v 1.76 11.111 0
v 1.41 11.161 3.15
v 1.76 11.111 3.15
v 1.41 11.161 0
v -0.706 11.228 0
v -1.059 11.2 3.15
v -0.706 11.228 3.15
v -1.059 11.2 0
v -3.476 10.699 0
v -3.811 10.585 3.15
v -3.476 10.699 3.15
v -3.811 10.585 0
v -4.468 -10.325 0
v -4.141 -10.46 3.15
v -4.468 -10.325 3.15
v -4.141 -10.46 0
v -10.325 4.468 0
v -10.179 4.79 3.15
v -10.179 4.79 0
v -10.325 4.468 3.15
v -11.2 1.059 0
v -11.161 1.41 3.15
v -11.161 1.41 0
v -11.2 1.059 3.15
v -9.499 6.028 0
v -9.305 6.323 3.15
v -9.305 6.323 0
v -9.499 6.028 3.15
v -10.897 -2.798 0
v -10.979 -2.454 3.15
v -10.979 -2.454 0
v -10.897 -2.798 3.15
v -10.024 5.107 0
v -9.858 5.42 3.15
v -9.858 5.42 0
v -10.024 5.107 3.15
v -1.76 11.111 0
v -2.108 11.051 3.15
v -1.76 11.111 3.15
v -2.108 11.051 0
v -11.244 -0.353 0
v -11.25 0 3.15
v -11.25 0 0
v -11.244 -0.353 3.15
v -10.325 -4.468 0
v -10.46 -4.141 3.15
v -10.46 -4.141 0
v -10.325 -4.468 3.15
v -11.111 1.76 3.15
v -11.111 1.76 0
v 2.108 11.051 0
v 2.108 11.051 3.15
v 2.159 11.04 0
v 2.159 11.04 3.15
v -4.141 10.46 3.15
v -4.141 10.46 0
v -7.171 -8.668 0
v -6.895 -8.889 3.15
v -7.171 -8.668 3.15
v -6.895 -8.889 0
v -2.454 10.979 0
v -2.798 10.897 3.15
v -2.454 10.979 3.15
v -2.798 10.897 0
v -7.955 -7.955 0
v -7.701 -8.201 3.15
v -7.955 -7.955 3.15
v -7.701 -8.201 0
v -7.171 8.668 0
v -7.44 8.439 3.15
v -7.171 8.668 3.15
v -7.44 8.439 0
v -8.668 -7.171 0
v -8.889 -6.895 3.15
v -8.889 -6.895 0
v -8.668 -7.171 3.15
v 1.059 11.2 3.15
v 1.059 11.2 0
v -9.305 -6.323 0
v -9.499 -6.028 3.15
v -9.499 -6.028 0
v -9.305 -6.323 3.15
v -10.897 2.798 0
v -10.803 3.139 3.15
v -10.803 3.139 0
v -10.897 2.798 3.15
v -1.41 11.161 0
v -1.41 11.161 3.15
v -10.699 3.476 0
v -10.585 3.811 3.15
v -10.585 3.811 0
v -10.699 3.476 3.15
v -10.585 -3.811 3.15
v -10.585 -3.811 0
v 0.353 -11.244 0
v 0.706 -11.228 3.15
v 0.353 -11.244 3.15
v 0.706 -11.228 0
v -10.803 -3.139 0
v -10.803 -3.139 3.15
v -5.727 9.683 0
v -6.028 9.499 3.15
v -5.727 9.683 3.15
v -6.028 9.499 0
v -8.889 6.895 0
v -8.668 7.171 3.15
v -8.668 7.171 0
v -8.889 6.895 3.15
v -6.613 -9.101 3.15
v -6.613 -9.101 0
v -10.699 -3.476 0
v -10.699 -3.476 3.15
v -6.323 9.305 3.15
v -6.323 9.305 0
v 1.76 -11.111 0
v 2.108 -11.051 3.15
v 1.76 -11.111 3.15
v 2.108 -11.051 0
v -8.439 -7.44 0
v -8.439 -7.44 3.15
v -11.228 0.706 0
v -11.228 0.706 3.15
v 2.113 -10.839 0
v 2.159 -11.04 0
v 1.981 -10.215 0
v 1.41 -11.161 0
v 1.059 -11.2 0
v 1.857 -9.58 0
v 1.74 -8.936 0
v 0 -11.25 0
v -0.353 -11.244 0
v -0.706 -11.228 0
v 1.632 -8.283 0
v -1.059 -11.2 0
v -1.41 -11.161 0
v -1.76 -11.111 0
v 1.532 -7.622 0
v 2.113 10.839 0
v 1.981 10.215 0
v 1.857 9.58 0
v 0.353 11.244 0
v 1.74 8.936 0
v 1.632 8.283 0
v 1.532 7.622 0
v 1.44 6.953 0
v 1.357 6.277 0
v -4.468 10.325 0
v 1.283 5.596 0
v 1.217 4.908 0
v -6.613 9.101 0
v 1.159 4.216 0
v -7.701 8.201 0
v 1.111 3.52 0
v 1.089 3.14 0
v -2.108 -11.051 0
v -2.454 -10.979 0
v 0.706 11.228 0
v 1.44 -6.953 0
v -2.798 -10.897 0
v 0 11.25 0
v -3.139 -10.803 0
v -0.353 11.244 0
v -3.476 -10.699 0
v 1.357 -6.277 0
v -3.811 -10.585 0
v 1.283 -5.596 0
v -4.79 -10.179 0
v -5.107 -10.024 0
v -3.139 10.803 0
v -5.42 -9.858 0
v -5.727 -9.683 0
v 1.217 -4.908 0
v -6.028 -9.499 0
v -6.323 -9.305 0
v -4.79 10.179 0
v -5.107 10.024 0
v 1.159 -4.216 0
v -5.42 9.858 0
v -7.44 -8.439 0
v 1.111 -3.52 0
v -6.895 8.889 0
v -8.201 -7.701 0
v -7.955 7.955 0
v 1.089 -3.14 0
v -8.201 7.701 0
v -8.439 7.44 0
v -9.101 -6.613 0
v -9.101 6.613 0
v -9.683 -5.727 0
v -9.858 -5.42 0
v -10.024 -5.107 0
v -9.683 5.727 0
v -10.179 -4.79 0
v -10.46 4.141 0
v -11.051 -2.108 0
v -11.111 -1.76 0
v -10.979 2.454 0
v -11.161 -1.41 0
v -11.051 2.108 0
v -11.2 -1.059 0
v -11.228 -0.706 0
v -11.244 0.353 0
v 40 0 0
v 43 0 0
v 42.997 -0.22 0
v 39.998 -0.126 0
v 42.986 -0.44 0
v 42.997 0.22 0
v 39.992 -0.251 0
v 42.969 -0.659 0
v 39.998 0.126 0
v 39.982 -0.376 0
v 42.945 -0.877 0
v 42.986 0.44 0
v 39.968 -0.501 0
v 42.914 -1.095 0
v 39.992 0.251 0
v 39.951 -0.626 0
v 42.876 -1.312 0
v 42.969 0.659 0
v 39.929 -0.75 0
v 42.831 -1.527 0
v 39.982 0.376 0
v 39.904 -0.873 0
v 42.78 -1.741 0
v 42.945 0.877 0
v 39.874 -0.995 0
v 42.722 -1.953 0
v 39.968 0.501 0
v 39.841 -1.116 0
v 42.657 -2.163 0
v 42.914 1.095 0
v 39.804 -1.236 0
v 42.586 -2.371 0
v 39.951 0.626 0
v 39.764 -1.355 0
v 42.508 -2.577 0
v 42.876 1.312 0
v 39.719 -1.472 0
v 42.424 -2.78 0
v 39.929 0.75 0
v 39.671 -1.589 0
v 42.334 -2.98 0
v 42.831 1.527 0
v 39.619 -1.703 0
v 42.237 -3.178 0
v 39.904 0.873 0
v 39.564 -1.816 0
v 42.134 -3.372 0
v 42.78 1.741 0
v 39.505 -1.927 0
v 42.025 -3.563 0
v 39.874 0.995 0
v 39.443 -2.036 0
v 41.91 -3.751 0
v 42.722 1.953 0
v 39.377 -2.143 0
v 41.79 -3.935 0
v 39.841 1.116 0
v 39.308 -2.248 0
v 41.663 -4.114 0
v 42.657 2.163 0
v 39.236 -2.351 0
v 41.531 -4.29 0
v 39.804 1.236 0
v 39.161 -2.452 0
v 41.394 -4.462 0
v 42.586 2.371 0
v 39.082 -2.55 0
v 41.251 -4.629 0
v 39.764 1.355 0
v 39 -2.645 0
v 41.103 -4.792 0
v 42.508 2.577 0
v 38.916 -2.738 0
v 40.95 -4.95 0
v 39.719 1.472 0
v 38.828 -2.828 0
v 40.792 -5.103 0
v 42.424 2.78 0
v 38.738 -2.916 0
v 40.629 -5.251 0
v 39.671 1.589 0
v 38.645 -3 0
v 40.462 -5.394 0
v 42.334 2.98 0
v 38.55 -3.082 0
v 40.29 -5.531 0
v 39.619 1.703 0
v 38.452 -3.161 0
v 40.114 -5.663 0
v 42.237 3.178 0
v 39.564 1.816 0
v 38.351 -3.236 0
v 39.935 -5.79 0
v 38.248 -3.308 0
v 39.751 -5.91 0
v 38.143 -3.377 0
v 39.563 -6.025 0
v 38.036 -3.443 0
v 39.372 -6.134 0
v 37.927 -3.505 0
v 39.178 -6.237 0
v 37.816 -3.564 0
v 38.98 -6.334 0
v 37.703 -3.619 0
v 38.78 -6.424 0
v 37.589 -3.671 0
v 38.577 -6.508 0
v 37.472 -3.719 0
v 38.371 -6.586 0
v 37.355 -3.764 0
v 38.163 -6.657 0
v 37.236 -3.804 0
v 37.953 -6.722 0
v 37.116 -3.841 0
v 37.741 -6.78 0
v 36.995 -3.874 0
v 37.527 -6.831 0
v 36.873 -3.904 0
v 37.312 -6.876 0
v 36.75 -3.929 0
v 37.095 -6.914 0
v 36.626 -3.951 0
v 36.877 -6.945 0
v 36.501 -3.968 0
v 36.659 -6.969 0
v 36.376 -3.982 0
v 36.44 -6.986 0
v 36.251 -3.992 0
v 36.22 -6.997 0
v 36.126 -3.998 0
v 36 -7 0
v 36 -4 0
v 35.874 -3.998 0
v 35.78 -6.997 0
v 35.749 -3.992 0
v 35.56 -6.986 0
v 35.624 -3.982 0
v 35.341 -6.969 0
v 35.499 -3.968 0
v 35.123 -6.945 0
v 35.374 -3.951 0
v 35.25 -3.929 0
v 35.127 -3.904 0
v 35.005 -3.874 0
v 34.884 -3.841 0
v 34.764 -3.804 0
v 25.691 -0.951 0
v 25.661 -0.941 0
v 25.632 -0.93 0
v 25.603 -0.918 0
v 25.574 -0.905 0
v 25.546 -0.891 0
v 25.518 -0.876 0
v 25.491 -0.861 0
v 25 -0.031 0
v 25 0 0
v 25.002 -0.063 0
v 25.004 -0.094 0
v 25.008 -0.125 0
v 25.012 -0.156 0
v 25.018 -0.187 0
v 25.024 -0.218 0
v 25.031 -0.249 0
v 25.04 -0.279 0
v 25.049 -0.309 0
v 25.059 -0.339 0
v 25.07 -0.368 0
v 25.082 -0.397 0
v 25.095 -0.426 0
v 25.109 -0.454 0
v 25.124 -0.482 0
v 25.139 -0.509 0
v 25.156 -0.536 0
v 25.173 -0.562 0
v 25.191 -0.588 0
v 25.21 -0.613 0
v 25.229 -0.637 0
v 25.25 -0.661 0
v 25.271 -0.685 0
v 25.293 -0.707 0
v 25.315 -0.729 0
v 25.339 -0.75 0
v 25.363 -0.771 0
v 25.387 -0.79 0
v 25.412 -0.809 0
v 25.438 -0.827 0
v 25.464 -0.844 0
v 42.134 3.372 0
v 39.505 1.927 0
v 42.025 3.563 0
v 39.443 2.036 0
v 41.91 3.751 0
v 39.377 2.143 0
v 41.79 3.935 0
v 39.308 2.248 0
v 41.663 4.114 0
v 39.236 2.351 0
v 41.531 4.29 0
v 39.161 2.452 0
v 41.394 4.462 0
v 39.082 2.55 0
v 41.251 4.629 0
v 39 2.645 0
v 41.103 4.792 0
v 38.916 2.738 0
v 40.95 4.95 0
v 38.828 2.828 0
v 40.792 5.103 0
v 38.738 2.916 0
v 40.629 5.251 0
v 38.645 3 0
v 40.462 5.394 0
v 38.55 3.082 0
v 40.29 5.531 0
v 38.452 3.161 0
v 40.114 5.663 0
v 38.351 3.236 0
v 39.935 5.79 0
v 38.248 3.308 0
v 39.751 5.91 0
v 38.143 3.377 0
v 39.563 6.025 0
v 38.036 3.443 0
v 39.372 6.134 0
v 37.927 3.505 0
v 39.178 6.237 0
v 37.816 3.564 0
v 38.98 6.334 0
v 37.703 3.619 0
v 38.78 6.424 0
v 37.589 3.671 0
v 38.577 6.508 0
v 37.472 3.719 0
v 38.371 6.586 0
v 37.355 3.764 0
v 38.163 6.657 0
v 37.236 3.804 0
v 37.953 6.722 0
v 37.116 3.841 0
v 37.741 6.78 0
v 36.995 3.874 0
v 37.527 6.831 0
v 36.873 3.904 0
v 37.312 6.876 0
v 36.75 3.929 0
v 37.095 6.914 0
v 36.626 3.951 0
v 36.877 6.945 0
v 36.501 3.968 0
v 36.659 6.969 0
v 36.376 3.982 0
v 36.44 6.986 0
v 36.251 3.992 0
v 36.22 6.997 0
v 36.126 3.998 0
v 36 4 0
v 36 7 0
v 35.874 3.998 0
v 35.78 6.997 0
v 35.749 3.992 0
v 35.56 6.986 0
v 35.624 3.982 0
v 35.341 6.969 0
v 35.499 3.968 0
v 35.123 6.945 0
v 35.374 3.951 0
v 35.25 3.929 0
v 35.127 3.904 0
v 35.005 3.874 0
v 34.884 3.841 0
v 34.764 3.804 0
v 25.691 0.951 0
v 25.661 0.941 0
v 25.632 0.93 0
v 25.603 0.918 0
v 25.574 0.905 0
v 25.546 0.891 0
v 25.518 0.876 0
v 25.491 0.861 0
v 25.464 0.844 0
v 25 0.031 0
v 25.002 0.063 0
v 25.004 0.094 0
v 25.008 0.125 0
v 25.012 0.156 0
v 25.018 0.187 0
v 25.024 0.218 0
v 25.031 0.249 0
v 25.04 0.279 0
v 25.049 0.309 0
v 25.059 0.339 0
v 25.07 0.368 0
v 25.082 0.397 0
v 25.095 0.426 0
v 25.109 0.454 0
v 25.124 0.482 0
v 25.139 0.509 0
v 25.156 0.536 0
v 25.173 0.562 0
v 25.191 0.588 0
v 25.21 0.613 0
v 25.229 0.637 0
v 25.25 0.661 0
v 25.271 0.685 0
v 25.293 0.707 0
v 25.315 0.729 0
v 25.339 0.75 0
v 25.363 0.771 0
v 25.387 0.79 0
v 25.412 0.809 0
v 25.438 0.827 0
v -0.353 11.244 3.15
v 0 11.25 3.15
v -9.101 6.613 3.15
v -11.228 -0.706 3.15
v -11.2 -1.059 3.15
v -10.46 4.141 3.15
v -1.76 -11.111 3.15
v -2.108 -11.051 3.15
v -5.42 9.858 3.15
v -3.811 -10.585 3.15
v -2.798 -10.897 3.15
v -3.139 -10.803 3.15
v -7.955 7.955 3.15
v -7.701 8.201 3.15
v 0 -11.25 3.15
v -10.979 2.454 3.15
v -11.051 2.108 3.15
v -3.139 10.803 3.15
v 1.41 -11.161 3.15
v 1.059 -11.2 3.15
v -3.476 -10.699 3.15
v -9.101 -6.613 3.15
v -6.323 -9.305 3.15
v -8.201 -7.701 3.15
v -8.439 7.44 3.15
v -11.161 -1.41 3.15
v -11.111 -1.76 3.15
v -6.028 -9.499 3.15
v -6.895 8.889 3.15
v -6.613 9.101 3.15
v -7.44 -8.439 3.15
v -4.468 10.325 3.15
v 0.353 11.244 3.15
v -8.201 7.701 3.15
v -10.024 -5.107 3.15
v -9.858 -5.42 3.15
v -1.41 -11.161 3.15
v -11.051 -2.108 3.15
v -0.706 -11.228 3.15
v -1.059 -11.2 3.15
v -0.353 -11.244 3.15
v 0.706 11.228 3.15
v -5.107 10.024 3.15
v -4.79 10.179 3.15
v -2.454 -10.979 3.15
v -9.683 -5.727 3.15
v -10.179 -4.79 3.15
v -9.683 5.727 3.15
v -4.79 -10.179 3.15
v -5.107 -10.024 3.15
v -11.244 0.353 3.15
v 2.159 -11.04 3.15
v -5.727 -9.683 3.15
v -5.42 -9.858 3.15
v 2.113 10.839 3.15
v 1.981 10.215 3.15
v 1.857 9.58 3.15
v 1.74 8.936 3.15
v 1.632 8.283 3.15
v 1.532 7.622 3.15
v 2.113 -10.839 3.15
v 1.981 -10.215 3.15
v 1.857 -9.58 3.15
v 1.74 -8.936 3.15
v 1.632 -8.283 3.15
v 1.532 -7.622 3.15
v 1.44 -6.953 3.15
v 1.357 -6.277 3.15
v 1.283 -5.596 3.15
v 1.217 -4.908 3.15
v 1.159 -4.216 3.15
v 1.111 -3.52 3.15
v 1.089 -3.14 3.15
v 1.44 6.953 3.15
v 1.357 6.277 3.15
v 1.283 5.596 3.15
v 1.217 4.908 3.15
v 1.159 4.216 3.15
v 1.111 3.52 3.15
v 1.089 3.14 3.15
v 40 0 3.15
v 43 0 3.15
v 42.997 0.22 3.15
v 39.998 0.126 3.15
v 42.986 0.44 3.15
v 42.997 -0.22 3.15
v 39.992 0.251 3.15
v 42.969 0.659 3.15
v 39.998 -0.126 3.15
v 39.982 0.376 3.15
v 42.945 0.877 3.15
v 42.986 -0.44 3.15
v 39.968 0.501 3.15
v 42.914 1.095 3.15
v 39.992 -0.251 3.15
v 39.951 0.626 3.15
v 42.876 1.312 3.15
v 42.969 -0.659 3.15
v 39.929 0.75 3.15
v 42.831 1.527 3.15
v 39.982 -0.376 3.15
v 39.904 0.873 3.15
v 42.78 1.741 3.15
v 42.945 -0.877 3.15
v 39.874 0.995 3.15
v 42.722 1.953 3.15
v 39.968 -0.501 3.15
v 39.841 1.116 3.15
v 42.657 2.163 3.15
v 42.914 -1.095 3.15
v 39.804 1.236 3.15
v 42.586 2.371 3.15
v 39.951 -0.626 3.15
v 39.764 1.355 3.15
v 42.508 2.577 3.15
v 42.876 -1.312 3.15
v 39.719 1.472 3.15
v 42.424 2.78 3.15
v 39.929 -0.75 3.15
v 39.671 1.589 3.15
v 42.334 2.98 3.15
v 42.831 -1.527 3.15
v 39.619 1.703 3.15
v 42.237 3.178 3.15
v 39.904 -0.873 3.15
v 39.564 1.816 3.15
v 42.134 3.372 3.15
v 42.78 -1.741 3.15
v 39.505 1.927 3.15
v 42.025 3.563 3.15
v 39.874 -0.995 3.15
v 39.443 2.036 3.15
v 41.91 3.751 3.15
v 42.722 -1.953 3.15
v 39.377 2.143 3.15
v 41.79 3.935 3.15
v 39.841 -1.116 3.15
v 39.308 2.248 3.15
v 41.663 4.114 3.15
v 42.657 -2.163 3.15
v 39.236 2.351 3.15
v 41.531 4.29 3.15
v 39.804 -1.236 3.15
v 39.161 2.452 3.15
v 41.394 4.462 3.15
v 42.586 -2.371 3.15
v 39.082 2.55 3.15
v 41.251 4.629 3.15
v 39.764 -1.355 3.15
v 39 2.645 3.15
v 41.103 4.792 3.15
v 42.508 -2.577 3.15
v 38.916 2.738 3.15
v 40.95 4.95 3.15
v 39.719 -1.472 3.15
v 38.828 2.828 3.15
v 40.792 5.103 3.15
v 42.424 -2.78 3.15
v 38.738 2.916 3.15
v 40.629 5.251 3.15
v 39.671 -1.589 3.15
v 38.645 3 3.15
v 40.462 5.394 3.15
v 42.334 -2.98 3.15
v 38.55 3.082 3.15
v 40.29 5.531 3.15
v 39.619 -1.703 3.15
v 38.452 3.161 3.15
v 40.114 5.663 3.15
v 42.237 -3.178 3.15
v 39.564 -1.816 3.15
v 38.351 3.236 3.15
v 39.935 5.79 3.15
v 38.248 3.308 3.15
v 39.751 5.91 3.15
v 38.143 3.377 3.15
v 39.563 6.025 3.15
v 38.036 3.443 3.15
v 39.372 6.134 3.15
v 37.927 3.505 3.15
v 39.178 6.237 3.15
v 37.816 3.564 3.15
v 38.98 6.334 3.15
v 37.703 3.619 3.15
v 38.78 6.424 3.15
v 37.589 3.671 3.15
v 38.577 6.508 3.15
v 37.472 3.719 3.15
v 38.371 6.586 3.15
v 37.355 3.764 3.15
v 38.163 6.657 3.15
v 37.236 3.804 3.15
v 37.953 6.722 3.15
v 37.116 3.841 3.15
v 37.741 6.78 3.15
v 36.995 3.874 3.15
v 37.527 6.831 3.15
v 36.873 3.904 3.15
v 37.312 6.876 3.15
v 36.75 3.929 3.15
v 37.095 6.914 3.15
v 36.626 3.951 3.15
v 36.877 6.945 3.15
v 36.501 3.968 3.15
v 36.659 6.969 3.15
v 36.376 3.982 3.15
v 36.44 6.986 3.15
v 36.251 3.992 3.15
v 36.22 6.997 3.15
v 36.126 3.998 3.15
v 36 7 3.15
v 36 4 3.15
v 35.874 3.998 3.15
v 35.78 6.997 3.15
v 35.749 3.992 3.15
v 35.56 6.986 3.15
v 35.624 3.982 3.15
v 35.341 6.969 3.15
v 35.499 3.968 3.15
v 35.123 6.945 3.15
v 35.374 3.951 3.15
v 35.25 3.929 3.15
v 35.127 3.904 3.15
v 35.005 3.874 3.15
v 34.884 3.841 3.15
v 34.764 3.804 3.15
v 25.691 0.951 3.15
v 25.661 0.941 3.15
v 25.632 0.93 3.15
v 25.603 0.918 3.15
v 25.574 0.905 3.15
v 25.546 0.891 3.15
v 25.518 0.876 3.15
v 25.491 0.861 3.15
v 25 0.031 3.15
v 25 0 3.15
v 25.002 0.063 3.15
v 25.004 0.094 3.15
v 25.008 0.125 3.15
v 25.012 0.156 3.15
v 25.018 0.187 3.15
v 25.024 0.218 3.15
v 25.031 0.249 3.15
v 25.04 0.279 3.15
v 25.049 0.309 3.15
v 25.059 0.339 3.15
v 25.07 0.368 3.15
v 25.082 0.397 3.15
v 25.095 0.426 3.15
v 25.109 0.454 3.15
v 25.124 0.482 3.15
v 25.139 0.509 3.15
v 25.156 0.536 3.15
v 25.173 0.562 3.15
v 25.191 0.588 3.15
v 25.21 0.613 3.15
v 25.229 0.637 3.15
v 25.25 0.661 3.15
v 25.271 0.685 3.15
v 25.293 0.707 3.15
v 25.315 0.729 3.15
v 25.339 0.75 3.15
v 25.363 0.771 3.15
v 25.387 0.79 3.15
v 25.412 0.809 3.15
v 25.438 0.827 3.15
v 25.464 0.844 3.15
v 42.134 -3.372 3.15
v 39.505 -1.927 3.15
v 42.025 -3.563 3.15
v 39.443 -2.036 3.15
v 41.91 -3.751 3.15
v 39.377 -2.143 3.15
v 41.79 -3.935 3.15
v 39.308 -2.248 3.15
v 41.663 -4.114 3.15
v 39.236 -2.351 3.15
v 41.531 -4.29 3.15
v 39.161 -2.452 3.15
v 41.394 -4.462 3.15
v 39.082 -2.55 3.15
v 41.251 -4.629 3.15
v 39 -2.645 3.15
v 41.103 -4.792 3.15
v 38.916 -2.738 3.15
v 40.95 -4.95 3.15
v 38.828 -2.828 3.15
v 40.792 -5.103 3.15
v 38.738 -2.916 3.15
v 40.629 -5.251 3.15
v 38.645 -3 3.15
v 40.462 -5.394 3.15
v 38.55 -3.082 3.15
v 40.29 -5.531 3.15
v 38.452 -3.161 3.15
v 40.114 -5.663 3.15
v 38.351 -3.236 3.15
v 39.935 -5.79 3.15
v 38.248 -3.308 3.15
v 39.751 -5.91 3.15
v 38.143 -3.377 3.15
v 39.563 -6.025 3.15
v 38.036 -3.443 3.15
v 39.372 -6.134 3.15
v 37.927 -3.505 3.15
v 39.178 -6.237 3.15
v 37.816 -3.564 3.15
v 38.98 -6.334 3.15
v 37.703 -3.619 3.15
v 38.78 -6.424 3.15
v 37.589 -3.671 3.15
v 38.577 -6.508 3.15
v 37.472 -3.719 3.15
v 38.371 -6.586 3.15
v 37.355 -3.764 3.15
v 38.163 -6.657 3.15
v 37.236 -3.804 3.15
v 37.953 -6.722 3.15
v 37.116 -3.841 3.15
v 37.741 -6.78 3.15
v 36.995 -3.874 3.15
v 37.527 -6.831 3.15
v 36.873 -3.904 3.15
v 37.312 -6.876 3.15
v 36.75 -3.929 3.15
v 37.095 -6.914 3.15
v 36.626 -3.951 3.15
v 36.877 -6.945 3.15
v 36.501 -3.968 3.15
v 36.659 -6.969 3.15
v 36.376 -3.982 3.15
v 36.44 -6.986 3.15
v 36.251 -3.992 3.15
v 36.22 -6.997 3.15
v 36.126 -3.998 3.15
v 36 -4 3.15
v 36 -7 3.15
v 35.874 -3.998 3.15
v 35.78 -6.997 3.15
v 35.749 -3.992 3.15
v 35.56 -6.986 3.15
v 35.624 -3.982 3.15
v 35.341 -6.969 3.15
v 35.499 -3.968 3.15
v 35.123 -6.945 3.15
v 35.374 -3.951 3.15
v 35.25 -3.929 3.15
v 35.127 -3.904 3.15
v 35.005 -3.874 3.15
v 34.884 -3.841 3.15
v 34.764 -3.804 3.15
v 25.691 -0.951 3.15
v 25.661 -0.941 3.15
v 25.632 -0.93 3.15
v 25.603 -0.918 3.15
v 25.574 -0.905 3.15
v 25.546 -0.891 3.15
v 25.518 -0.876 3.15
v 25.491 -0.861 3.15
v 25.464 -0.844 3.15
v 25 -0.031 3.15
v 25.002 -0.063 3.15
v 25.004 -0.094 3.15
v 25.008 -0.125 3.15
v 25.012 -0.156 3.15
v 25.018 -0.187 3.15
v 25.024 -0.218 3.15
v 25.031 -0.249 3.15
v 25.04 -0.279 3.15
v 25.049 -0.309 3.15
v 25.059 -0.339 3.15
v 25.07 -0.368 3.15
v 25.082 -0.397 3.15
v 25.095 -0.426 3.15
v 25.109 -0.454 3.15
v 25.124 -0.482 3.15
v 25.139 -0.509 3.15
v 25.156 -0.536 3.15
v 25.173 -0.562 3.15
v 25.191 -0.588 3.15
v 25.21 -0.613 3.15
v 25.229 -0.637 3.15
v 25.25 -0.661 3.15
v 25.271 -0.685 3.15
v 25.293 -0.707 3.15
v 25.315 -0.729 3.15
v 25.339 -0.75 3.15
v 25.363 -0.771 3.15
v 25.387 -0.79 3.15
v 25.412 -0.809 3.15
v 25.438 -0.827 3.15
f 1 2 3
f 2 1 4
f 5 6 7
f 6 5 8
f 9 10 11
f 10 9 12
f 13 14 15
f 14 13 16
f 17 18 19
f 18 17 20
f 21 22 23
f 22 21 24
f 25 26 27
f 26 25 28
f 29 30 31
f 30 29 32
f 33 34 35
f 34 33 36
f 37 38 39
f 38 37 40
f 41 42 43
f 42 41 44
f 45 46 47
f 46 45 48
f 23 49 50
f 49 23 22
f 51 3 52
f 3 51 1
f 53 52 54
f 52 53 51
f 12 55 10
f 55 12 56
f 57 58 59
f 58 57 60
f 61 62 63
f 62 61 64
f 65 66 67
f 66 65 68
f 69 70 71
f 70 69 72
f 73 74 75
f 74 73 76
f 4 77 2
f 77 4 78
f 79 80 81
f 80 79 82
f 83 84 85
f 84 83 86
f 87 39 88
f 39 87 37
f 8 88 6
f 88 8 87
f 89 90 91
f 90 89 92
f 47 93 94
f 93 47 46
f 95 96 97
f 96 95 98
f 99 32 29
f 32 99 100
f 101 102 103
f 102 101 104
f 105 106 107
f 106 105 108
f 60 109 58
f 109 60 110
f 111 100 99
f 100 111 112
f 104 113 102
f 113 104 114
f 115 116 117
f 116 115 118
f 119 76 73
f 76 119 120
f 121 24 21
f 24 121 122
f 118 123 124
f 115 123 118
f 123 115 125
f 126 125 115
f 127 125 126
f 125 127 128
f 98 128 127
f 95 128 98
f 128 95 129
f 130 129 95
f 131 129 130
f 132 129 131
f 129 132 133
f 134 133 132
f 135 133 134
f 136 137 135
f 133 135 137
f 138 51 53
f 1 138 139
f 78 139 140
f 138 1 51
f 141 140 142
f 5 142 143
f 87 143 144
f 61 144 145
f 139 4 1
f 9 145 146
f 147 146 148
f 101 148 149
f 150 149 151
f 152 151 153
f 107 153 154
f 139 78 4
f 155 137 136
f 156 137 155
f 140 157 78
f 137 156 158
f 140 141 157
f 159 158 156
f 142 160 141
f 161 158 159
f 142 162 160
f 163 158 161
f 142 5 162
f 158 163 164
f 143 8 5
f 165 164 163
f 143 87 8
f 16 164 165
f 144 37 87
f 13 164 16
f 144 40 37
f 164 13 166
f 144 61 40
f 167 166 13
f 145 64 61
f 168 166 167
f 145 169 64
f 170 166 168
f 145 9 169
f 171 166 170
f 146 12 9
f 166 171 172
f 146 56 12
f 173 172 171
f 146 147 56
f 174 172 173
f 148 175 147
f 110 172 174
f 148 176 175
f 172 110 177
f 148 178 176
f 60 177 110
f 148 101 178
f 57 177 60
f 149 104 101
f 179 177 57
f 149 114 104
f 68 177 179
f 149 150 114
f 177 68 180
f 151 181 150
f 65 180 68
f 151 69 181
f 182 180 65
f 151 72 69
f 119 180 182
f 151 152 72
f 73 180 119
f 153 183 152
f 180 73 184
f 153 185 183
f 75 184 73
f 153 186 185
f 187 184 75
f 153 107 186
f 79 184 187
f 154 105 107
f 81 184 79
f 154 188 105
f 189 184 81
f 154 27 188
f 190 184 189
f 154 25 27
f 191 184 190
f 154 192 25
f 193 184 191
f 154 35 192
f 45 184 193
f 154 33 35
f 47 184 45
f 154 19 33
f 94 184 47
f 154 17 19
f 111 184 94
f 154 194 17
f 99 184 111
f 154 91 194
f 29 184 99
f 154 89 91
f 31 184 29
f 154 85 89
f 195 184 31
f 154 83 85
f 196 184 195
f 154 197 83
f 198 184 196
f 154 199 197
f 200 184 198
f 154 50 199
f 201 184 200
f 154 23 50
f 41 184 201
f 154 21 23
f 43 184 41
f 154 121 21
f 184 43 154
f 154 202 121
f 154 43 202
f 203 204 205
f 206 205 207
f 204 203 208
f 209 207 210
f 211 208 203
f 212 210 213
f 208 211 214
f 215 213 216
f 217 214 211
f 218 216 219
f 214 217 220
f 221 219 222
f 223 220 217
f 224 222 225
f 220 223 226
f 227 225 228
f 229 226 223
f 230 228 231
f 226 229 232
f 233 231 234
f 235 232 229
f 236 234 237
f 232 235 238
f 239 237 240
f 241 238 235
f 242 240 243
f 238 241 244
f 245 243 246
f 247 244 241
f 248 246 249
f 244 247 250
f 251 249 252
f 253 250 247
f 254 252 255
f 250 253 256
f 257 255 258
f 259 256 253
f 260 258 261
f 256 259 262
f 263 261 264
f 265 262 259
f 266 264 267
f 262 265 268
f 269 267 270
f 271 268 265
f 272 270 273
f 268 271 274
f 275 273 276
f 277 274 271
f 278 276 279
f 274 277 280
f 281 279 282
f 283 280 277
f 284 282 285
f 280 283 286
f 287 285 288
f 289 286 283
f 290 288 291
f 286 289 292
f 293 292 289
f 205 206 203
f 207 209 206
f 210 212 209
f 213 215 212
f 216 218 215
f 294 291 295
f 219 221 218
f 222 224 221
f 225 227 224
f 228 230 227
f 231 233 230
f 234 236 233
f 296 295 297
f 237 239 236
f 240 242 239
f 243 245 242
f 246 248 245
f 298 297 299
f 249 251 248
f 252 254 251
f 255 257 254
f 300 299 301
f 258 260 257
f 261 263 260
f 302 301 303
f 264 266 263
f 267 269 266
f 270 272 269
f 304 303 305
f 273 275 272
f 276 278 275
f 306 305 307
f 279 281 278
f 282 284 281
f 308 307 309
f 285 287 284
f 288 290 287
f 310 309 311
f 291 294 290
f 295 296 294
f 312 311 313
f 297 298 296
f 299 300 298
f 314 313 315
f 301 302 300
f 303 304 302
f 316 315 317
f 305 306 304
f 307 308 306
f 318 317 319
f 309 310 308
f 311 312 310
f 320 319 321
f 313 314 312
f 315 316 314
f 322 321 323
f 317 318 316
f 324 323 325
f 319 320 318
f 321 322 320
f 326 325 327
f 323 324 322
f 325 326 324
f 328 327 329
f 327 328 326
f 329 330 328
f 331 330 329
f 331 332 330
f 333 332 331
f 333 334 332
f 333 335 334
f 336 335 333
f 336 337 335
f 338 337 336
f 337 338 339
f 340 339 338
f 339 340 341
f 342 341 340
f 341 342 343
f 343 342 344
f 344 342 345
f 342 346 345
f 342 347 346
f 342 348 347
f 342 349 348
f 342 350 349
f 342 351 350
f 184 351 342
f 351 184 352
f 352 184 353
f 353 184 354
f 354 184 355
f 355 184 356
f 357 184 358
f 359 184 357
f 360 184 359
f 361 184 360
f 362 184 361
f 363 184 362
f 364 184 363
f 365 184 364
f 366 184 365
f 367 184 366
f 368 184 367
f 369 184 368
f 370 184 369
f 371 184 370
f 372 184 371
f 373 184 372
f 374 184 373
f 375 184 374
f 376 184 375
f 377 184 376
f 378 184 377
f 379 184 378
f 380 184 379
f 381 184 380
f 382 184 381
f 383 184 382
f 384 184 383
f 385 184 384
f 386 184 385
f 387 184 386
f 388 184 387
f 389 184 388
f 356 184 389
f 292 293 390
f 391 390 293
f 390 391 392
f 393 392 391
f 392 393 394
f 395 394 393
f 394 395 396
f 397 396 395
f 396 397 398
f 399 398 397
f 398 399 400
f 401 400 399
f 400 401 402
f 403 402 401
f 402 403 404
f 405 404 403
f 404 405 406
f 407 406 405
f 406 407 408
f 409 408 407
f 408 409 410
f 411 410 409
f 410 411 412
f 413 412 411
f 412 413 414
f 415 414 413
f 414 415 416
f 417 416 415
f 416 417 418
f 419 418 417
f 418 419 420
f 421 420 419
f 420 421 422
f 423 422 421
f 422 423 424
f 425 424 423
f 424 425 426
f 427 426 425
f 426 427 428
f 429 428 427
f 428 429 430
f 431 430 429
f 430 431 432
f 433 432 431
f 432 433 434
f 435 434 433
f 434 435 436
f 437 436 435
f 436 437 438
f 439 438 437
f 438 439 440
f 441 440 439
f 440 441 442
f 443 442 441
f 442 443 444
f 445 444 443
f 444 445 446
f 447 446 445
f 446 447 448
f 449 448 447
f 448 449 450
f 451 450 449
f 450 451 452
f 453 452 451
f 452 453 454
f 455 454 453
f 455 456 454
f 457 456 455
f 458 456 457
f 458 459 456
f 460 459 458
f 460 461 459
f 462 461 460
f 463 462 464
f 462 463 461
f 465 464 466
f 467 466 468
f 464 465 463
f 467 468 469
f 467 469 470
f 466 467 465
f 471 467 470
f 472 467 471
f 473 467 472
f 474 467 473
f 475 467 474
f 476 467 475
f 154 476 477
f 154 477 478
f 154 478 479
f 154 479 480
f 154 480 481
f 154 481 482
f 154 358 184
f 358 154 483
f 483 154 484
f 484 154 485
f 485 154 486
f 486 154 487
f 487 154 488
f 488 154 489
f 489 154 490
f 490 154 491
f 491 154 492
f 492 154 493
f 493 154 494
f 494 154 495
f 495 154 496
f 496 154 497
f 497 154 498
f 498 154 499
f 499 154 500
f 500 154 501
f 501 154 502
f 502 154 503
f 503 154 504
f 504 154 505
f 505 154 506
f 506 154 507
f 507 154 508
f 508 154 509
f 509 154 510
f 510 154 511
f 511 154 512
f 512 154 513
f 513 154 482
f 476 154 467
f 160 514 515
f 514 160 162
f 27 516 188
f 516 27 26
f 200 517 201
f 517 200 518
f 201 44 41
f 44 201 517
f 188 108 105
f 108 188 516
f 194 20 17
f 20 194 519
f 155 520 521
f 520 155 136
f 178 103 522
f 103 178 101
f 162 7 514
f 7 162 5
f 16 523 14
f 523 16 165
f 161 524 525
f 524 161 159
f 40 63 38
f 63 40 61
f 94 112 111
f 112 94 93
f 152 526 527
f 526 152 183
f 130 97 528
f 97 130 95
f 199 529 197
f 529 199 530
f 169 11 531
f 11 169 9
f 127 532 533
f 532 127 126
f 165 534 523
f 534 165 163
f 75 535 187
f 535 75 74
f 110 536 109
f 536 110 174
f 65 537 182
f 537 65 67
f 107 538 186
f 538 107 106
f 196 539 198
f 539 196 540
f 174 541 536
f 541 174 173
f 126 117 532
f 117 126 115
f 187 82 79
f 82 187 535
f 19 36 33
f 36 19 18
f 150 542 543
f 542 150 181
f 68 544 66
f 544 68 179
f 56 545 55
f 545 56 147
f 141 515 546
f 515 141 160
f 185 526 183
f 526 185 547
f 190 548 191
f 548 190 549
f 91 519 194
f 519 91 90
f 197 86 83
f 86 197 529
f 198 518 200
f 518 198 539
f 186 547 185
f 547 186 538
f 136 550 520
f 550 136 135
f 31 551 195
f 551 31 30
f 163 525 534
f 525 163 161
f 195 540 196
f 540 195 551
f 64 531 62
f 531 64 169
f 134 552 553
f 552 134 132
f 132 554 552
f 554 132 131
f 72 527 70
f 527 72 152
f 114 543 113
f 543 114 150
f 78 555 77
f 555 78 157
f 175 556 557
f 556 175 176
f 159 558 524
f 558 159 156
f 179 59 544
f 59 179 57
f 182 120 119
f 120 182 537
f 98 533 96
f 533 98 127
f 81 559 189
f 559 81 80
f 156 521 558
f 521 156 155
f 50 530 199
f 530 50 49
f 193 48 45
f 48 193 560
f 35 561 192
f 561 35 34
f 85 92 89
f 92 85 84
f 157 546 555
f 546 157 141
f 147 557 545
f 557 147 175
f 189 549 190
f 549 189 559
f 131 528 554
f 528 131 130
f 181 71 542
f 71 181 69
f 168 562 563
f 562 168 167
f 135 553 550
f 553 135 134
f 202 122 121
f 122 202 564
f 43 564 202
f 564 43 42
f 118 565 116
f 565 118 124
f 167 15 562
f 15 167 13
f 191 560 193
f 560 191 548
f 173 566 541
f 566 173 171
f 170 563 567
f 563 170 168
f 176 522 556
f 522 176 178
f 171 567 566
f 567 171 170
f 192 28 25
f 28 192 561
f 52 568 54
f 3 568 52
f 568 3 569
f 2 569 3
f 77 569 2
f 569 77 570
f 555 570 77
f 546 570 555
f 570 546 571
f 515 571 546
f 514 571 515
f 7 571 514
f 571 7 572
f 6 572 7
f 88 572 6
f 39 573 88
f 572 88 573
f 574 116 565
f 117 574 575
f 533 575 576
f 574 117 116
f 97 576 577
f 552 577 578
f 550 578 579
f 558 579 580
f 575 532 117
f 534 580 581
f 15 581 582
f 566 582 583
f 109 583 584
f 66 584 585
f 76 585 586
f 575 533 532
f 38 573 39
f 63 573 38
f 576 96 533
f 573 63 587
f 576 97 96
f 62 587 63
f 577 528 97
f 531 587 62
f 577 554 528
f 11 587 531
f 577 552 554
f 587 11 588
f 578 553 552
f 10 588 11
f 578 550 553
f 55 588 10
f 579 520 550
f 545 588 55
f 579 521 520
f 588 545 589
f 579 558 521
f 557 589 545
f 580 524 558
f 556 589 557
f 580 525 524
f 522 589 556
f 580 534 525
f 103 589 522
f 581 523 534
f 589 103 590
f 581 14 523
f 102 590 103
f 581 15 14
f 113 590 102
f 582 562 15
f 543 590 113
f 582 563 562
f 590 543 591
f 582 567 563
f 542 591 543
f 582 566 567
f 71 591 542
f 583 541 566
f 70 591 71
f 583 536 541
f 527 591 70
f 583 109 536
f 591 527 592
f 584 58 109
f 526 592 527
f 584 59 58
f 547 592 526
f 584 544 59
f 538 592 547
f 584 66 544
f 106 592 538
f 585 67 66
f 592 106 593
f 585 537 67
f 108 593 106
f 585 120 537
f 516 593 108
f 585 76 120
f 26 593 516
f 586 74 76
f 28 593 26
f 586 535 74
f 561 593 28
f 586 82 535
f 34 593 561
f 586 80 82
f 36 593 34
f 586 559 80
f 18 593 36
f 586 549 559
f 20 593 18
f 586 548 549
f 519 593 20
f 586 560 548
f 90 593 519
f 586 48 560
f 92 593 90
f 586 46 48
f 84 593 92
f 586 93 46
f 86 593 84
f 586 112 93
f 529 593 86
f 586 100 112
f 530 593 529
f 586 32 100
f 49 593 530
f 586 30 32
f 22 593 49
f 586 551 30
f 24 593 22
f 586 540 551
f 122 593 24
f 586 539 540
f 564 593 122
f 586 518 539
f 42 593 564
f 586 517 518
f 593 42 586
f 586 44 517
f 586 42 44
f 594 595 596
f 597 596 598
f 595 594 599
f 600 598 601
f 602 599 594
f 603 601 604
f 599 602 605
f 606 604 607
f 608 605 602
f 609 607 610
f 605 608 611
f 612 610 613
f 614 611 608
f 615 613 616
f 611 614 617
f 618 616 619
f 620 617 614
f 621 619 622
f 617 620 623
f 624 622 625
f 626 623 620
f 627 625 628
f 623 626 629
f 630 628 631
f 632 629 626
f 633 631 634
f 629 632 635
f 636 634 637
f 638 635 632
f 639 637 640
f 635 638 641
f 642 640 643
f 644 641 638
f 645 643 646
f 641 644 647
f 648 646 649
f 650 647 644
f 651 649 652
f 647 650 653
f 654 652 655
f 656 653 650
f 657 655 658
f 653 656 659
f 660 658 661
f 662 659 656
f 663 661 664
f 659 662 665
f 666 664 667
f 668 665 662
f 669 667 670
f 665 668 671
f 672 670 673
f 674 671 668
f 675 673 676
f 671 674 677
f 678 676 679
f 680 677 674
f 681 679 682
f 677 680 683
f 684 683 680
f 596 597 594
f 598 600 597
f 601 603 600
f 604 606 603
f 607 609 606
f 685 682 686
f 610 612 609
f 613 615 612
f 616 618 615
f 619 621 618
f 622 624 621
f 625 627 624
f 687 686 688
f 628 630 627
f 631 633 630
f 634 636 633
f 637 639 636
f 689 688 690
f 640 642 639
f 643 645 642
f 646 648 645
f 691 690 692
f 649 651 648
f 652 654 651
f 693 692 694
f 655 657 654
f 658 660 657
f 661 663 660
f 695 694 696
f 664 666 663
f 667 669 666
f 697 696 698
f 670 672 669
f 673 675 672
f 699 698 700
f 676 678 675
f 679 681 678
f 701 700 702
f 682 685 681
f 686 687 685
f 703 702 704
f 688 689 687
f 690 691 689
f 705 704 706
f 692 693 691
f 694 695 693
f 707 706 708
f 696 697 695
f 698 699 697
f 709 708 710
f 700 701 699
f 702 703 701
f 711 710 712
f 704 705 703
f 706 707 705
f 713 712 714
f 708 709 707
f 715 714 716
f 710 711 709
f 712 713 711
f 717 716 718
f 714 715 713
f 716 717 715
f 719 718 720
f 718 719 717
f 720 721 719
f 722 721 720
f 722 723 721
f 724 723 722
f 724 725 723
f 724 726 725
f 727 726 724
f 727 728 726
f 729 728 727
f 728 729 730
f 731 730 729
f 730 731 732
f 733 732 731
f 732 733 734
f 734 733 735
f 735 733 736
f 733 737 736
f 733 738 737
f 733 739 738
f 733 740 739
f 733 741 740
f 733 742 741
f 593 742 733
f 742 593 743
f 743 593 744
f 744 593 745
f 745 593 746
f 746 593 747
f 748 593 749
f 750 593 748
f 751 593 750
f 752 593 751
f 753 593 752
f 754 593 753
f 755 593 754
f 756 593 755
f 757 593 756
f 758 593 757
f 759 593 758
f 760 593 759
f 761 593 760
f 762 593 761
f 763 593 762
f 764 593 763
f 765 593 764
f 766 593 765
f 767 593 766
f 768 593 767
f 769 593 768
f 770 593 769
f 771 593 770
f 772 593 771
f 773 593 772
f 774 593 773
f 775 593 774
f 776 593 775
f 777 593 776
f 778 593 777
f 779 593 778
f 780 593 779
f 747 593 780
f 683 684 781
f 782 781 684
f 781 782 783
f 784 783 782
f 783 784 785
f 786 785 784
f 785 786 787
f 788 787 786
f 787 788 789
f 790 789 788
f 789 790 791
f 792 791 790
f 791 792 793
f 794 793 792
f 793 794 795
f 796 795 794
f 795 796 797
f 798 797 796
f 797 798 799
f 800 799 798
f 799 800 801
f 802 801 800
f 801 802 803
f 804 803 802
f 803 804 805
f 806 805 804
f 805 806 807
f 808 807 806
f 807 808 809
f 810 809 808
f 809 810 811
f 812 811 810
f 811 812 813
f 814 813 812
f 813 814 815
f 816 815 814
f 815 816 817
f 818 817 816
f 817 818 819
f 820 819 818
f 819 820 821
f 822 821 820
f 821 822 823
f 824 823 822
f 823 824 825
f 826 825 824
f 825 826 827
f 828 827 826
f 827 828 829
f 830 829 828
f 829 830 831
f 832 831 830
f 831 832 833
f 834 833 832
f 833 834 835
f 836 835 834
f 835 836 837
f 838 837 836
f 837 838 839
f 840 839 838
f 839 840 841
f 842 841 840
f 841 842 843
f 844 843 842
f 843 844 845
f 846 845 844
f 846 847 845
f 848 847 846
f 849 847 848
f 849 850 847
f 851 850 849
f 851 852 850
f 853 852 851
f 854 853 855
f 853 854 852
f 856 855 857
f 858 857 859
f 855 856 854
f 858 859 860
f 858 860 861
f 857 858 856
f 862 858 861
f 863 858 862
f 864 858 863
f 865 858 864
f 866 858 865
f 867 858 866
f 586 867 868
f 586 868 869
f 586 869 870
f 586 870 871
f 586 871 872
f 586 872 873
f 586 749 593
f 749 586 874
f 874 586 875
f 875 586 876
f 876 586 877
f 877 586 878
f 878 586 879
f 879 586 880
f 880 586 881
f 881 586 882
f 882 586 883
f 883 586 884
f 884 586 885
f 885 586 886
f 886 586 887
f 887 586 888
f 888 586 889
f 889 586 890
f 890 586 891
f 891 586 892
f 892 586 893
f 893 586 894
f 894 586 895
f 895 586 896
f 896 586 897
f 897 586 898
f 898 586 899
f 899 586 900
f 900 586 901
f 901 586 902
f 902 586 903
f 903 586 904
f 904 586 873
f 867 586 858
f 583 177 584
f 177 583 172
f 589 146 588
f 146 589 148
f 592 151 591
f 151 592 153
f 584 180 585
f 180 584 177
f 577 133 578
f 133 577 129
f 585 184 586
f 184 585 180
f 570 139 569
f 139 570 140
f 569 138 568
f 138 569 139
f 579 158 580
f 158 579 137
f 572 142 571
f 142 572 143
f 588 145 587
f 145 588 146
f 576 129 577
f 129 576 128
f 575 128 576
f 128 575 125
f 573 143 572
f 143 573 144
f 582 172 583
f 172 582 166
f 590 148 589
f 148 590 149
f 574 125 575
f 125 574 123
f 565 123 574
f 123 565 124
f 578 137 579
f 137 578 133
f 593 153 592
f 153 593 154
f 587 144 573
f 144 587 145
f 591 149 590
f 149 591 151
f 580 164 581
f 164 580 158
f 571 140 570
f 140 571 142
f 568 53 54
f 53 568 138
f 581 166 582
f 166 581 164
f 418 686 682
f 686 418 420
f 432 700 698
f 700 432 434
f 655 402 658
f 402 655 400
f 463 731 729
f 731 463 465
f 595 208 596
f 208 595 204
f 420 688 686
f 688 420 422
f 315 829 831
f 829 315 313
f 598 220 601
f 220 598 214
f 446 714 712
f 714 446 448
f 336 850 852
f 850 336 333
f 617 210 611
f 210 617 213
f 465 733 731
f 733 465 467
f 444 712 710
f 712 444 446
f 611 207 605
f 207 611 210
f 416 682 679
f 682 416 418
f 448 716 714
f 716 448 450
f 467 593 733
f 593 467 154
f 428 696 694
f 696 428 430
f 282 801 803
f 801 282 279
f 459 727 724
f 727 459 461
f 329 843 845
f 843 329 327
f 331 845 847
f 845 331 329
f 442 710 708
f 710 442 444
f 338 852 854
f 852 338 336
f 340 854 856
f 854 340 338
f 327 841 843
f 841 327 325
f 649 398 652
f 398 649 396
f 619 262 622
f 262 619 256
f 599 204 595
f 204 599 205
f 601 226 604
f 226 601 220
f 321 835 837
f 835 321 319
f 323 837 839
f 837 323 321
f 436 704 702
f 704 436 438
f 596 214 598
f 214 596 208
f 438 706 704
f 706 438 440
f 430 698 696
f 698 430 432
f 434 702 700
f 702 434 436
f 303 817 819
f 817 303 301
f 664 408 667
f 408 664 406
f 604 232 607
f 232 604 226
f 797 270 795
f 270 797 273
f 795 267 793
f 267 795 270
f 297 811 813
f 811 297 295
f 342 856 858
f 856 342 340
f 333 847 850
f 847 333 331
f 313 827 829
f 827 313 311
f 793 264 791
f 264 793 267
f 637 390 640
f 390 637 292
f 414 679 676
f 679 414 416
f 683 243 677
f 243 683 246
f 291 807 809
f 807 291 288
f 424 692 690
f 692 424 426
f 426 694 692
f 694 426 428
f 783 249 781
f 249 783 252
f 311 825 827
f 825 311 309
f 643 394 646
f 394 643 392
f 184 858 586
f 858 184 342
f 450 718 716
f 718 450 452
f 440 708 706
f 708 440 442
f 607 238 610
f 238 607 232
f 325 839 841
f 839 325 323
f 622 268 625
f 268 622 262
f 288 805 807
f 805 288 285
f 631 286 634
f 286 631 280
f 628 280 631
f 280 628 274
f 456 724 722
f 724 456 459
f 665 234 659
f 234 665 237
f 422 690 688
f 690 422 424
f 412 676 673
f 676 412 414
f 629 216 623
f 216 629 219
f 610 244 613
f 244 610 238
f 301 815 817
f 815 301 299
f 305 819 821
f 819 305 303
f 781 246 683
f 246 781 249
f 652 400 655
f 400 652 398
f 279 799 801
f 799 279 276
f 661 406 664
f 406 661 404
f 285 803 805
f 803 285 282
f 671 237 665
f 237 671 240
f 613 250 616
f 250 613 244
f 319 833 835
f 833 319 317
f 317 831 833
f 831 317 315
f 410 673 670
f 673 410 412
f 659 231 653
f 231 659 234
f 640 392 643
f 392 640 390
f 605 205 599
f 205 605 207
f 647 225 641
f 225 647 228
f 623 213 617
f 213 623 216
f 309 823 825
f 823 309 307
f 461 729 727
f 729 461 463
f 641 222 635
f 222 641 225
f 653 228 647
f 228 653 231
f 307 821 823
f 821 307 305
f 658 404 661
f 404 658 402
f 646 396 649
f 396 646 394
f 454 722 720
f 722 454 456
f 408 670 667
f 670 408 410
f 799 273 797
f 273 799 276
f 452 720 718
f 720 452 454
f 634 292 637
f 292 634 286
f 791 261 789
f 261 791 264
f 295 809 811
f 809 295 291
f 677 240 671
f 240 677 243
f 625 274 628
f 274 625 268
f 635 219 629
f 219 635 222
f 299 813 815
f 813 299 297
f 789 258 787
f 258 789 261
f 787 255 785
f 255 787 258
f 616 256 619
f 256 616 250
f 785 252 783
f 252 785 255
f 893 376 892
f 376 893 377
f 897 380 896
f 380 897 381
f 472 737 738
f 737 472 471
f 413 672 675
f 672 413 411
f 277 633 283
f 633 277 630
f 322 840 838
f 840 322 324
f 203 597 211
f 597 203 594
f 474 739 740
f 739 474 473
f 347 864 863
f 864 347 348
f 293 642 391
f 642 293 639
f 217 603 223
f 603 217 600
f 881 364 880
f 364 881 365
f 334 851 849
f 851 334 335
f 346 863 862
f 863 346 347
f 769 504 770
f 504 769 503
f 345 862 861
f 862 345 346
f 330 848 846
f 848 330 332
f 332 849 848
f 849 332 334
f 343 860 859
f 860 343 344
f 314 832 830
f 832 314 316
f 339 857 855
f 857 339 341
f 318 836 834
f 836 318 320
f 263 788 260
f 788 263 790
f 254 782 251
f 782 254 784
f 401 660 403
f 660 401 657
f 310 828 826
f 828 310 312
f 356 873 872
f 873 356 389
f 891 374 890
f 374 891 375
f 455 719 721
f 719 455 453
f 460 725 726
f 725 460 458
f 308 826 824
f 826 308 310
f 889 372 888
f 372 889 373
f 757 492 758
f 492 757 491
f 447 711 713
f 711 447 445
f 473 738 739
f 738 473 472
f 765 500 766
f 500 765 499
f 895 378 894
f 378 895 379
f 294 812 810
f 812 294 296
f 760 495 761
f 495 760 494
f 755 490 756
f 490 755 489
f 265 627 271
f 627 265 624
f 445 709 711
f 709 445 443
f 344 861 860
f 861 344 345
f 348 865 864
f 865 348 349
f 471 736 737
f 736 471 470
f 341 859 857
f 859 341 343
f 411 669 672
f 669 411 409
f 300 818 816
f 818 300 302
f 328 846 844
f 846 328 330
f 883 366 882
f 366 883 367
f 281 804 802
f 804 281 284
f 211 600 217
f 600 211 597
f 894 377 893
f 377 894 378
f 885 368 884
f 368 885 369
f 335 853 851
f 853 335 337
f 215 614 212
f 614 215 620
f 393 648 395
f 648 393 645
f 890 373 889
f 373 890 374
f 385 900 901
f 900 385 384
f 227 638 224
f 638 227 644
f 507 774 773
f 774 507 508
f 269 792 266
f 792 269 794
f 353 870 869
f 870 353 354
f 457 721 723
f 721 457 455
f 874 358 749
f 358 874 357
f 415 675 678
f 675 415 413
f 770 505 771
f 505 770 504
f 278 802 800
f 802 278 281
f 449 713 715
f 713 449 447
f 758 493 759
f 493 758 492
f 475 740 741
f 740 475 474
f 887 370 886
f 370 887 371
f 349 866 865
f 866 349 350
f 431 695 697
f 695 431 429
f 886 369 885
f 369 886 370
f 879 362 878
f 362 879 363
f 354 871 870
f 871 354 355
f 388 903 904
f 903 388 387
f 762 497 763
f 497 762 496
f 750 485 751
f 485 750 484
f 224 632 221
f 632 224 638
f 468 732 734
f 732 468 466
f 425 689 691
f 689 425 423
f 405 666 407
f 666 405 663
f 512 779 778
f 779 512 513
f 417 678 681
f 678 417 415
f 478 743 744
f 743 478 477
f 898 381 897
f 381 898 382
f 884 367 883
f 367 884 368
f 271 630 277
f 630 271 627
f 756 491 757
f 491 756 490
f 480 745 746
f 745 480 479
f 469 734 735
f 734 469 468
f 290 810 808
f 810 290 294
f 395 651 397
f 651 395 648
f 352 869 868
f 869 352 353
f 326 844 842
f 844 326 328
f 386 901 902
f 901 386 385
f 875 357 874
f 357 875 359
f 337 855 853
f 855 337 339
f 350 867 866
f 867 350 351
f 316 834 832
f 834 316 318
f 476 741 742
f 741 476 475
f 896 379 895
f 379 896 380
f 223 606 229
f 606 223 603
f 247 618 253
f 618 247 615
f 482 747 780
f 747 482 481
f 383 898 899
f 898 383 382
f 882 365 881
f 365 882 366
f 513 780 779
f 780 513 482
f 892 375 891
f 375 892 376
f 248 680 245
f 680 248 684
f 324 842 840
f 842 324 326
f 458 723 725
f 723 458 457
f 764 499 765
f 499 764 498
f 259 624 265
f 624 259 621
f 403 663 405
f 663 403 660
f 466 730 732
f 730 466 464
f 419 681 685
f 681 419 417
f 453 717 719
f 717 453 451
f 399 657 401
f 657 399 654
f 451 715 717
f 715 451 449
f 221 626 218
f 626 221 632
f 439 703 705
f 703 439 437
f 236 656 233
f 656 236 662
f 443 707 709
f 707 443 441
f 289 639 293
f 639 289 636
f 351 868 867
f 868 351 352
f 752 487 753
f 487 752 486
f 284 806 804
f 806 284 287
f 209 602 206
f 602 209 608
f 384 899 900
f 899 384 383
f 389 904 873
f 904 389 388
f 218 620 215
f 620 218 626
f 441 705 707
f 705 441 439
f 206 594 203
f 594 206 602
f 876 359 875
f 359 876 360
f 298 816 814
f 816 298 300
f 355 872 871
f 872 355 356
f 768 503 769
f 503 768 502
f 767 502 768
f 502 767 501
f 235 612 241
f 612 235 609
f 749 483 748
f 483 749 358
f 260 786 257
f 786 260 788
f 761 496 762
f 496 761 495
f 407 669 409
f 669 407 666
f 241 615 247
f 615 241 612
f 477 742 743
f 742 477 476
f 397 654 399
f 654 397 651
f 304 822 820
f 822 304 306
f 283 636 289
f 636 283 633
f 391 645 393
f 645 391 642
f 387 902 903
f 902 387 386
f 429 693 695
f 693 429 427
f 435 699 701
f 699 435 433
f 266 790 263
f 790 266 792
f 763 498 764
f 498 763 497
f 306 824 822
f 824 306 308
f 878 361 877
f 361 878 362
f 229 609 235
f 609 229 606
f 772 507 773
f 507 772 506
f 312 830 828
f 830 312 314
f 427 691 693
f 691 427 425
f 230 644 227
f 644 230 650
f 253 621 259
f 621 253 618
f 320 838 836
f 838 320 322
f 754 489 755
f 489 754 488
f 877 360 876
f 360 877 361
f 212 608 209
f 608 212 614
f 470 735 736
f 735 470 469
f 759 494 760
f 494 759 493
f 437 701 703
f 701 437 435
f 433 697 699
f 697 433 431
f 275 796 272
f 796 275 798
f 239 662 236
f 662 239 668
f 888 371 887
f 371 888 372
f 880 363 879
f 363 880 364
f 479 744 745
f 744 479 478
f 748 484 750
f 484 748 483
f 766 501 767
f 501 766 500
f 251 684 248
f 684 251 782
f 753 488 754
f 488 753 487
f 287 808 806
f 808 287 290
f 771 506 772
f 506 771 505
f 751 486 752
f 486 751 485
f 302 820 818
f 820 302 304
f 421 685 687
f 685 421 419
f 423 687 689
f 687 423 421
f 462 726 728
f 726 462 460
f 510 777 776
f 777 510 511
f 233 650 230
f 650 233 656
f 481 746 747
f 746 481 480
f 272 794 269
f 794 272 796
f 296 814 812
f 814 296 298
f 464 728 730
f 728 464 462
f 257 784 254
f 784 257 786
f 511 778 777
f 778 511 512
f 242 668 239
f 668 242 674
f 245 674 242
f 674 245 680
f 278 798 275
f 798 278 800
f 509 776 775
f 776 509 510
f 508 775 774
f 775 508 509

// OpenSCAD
// Created by mrpeter
// https://www.thingiverse.com/thing:2838486
// Creative Commons - Attribution - Non-Commercial - Share Alike License

// Coins : diameter / thickness in mm
// UK £1 - 22.5 / 3.15
// 1 Euro coin 23.25 / 2.33
// Canadian Dollar 26.5 / 1.95
// Canadian quarter 23.88 / 1.58
// US Dollar 26.5 / 2
// US Quarter 24.26 / 1.75
// Australian $1 - 25 / 3
// Australian $2 - 20.5 / 2.8

/* [Coin] */
// (Diameter of the coin) :
coin_diameter = 22.5;
// (Coin thickness) :
coin_thickness = 3.15;
// (Style) :
coin_head_style = "Sweeping Curve"; // [Dual Cutouts,Sweeping Curve]
// (Use this to adjust how much of the head is cut away by the sweeping curve) :
sweeping_curve_x_offset = 10; // [0:20]

// (Only available with 'Dual Cutouts' style) :
coin_cutout = "yes"; // [yes,no]
// (The thickness of plastic left around the edge of the keyring hole)
coin_cutout_border_thickness = 3;

/* [Cutout indents either side] */
// (X offset of the cutout from the center of the coin) :
cutout_x_offset = 2; // [0:10]
// (Y offset of the cutout from the center of the coin) :
cutout_y_offset = 4; // [0:10]
// (Diameter of cutout. Default should be ok most of the time) :
cutout_diameter = 15; // [0:40]

/* [Handle] */
// (Length) :
handle_length = 36; // [15:100]
// (The handle width ending at the head)
handle_width1 = 6; // [10:30]
// (The handle width ending at the keyring cutout) :
handle_width2 = 14; // [10:30]

/* [Keyring Hole] */
// (Distance between two elongated hole centerpoints. Zero will give you just a circular hole.) :
keyring_hole_width = 10;  // [0:20]
// Two holes in the handle, these are joined together. They can be moved apart to make a slat or a teardrop type of hole
handle_cutout_hole_diameter1 = 8; // [1:20]
handle_cutout_hole_diameter2 = 2; // [1:20]

/* [Handle Text] */
// (Show the text?):
show_text = "no"; // [yes,no]
// (Text) :
text = "£1";
// (Font):
font = "Helvetica Neue:style=Bold";
// (Font Size):
font_size = 6 ; // [4:12]
// (X Offset) :
text_x = 13; // [4:100]
// (Y Offset) :
text_y = -3; // [-10:10]
// (Typically use the layer height so it doesn't stick out too much.) :
text_height = 0.4; // [0.1:0.1:2]

/* [Smoothing] */
// (Smoothness of curves) :
smoothness = 200; // [25:25:200]

// ---- End of customisation parameters

if( show_text == "yes" ) {
    color([1,0,0]) translate([text_x,text_y,coin_thickness]) linear_extrude(height = text_height) { text(text,font=font, size=font_size); }
}
// Calculations
$fn = smoothness;

cutout_pos1_x = (cutout_diameter/2)+cutout_x_offset;
cutout_pos1_y = (cutout_diameter/2)+cutout_y_offset;
cutout_thickness = coin_thickness+2;

color([1,0.6,0]) difference() {
    union() {
        difference() {
            // Main coin part
            cylinder(h=coin_thickness,d=coin_diameter);
            if ( coin_head_style == "Sweeping Curve" ) {
                translate([sweeping_curve_x_offset, 0, -1]) scale([.4, 1, 1]) cylinder(h = coin_thickness+2, d = coin_diameter*2);
            }
        }
        // The handle
        hull() {
        translate([0,0,0]) cylinder(h=coin_thickness,d=handle_width1);

        // Cylinder at end of handle (keyring end)
        translate([handle_length,0,0]) cylinder(h=coin_thickness,d=handle_width2);
        }
    }

    union() {
        if( coin_head_style == "Dual Cutouts" ) {
            // Lower cutout
            translate([cutout_pos1_x,-cutout_pos1_y,-1]) cylinder(h=cutout_thickness,d=cutout_diameter);
            // Upper cutout
            translate([cutout_pos1_x,cutout_pos1_y,-1]) cylinder(h=cutout_thickness,d=cutout_diameter);
        }
        hull() {
            // RHS Hole
            translate([handle_length,0,-1]) cylinder(h=cutout_thickness,d=handle_cutout_hole_diameter1);
            // Left Hole
            translate([handle_length-keyring_hole_width,0,-1]) cylinder(h=cutout_thickness,d=handle_cutout_hole_diameter2);
        }

        // Optional cutout for the trolley coin part
        // Get the main circle and cut out two 'ears' from that
        // Then that will be subtracted from the main part
        
        if( coin_cutout == "yes") {
            if( coin_head_style == "Dual Cutouts" ) {            
                union() {
                    difference() {
                    // Optional cutout for coin part
                    translate([0,0,-1]) cylinder(h=coin_thickness+2,d=coin_diameter-(coin_cutout_border_thickness*2));
                    // Lower cutout
                    translate([cutout_pos1_x,-cutout_pos1_y,-1]) cylinder(h=cutout_thickness,d=cutout_diameter+coin_cutout_border_thickness*2);
                    // Upper cutout
                    translate([cutout_pos1_x,cutout_pos1_y,-1]) cylinder(h=cutout_thickness,d=cutout_diameter+(coin_cutout_border_thickness*2));
                }
            }
            }
        }
    }
}
